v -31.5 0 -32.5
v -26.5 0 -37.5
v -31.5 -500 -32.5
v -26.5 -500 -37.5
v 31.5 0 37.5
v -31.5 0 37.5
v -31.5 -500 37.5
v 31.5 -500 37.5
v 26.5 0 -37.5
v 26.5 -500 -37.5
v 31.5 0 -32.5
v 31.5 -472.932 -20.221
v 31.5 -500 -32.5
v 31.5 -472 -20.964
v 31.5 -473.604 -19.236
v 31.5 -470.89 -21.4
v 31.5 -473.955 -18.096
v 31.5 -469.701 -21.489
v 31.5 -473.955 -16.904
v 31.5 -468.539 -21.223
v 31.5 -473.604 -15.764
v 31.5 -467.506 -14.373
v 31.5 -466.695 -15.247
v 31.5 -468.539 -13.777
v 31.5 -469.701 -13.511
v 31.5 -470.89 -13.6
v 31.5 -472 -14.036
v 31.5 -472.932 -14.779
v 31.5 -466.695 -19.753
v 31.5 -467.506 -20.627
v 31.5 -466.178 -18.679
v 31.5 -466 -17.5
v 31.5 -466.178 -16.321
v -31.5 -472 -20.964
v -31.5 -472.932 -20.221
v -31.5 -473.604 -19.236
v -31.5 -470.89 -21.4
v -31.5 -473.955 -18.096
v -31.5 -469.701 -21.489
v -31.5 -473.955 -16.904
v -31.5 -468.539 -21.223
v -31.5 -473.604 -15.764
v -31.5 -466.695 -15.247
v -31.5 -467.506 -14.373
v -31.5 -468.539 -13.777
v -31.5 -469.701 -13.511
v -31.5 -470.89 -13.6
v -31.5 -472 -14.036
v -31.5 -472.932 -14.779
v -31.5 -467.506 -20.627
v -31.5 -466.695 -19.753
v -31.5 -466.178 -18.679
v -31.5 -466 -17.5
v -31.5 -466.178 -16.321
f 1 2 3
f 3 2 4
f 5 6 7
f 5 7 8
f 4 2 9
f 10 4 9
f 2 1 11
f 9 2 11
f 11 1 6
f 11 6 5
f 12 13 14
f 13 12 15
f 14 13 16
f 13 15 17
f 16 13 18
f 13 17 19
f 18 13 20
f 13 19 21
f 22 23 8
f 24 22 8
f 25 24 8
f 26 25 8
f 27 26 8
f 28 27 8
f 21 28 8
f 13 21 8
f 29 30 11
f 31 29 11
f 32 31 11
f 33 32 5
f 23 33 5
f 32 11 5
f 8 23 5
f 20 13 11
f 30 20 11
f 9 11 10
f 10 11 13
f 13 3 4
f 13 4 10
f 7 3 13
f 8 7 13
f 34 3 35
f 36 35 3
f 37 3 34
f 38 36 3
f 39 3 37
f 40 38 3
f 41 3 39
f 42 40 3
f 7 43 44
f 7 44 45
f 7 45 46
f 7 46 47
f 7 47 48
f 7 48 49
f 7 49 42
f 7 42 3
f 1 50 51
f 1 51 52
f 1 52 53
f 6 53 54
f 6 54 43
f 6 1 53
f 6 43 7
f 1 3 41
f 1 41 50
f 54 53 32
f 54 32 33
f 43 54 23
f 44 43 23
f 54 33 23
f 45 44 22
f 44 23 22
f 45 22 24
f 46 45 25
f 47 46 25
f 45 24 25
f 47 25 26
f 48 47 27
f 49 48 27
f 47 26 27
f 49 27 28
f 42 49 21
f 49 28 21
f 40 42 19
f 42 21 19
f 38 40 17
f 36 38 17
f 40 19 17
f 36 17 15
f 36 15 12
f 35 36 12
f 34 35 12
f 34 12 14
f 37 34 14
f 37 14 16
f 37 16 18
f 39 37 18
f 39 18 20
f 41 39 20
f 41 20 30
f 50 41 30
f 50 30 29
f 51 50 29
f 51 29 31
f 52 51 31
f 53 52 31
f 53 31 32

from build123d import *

# Parameters (mm, degrees)
F0_W     = 63
F0_H     = 75
F1_DEPTH = 500
F2_SIZE  = 5
F3_R     = 4
F4_DEPTH = 63.001


with BuildPart() as f1:
    # F0 (on Front) → F1 (new body)
    with BuildSketch(Plane.XZ):
        Rectangle(F0_W, F0_H)
    extrude(amount=F1_DEPTH)

    # F2
    f2_edges = [f1.edges().sort_by_distance(p)[0] for p in [
        (31.5, -250, -37.5),
        (-31.5, -250, -37.5),
    ]]
    chamfer(f2_edges, length=F2_SIZE)

    # F3 (on face) → F4 (cut, through all)
    with BuildSketch(Plane.YZ.offset(31.5)):
        with Locations((-470, -17.5)):
            Circle(F3_R)
    extrude(amount=-F4_DEPTH, mode=Mode.SUBTRACT)


solid = f1.part
